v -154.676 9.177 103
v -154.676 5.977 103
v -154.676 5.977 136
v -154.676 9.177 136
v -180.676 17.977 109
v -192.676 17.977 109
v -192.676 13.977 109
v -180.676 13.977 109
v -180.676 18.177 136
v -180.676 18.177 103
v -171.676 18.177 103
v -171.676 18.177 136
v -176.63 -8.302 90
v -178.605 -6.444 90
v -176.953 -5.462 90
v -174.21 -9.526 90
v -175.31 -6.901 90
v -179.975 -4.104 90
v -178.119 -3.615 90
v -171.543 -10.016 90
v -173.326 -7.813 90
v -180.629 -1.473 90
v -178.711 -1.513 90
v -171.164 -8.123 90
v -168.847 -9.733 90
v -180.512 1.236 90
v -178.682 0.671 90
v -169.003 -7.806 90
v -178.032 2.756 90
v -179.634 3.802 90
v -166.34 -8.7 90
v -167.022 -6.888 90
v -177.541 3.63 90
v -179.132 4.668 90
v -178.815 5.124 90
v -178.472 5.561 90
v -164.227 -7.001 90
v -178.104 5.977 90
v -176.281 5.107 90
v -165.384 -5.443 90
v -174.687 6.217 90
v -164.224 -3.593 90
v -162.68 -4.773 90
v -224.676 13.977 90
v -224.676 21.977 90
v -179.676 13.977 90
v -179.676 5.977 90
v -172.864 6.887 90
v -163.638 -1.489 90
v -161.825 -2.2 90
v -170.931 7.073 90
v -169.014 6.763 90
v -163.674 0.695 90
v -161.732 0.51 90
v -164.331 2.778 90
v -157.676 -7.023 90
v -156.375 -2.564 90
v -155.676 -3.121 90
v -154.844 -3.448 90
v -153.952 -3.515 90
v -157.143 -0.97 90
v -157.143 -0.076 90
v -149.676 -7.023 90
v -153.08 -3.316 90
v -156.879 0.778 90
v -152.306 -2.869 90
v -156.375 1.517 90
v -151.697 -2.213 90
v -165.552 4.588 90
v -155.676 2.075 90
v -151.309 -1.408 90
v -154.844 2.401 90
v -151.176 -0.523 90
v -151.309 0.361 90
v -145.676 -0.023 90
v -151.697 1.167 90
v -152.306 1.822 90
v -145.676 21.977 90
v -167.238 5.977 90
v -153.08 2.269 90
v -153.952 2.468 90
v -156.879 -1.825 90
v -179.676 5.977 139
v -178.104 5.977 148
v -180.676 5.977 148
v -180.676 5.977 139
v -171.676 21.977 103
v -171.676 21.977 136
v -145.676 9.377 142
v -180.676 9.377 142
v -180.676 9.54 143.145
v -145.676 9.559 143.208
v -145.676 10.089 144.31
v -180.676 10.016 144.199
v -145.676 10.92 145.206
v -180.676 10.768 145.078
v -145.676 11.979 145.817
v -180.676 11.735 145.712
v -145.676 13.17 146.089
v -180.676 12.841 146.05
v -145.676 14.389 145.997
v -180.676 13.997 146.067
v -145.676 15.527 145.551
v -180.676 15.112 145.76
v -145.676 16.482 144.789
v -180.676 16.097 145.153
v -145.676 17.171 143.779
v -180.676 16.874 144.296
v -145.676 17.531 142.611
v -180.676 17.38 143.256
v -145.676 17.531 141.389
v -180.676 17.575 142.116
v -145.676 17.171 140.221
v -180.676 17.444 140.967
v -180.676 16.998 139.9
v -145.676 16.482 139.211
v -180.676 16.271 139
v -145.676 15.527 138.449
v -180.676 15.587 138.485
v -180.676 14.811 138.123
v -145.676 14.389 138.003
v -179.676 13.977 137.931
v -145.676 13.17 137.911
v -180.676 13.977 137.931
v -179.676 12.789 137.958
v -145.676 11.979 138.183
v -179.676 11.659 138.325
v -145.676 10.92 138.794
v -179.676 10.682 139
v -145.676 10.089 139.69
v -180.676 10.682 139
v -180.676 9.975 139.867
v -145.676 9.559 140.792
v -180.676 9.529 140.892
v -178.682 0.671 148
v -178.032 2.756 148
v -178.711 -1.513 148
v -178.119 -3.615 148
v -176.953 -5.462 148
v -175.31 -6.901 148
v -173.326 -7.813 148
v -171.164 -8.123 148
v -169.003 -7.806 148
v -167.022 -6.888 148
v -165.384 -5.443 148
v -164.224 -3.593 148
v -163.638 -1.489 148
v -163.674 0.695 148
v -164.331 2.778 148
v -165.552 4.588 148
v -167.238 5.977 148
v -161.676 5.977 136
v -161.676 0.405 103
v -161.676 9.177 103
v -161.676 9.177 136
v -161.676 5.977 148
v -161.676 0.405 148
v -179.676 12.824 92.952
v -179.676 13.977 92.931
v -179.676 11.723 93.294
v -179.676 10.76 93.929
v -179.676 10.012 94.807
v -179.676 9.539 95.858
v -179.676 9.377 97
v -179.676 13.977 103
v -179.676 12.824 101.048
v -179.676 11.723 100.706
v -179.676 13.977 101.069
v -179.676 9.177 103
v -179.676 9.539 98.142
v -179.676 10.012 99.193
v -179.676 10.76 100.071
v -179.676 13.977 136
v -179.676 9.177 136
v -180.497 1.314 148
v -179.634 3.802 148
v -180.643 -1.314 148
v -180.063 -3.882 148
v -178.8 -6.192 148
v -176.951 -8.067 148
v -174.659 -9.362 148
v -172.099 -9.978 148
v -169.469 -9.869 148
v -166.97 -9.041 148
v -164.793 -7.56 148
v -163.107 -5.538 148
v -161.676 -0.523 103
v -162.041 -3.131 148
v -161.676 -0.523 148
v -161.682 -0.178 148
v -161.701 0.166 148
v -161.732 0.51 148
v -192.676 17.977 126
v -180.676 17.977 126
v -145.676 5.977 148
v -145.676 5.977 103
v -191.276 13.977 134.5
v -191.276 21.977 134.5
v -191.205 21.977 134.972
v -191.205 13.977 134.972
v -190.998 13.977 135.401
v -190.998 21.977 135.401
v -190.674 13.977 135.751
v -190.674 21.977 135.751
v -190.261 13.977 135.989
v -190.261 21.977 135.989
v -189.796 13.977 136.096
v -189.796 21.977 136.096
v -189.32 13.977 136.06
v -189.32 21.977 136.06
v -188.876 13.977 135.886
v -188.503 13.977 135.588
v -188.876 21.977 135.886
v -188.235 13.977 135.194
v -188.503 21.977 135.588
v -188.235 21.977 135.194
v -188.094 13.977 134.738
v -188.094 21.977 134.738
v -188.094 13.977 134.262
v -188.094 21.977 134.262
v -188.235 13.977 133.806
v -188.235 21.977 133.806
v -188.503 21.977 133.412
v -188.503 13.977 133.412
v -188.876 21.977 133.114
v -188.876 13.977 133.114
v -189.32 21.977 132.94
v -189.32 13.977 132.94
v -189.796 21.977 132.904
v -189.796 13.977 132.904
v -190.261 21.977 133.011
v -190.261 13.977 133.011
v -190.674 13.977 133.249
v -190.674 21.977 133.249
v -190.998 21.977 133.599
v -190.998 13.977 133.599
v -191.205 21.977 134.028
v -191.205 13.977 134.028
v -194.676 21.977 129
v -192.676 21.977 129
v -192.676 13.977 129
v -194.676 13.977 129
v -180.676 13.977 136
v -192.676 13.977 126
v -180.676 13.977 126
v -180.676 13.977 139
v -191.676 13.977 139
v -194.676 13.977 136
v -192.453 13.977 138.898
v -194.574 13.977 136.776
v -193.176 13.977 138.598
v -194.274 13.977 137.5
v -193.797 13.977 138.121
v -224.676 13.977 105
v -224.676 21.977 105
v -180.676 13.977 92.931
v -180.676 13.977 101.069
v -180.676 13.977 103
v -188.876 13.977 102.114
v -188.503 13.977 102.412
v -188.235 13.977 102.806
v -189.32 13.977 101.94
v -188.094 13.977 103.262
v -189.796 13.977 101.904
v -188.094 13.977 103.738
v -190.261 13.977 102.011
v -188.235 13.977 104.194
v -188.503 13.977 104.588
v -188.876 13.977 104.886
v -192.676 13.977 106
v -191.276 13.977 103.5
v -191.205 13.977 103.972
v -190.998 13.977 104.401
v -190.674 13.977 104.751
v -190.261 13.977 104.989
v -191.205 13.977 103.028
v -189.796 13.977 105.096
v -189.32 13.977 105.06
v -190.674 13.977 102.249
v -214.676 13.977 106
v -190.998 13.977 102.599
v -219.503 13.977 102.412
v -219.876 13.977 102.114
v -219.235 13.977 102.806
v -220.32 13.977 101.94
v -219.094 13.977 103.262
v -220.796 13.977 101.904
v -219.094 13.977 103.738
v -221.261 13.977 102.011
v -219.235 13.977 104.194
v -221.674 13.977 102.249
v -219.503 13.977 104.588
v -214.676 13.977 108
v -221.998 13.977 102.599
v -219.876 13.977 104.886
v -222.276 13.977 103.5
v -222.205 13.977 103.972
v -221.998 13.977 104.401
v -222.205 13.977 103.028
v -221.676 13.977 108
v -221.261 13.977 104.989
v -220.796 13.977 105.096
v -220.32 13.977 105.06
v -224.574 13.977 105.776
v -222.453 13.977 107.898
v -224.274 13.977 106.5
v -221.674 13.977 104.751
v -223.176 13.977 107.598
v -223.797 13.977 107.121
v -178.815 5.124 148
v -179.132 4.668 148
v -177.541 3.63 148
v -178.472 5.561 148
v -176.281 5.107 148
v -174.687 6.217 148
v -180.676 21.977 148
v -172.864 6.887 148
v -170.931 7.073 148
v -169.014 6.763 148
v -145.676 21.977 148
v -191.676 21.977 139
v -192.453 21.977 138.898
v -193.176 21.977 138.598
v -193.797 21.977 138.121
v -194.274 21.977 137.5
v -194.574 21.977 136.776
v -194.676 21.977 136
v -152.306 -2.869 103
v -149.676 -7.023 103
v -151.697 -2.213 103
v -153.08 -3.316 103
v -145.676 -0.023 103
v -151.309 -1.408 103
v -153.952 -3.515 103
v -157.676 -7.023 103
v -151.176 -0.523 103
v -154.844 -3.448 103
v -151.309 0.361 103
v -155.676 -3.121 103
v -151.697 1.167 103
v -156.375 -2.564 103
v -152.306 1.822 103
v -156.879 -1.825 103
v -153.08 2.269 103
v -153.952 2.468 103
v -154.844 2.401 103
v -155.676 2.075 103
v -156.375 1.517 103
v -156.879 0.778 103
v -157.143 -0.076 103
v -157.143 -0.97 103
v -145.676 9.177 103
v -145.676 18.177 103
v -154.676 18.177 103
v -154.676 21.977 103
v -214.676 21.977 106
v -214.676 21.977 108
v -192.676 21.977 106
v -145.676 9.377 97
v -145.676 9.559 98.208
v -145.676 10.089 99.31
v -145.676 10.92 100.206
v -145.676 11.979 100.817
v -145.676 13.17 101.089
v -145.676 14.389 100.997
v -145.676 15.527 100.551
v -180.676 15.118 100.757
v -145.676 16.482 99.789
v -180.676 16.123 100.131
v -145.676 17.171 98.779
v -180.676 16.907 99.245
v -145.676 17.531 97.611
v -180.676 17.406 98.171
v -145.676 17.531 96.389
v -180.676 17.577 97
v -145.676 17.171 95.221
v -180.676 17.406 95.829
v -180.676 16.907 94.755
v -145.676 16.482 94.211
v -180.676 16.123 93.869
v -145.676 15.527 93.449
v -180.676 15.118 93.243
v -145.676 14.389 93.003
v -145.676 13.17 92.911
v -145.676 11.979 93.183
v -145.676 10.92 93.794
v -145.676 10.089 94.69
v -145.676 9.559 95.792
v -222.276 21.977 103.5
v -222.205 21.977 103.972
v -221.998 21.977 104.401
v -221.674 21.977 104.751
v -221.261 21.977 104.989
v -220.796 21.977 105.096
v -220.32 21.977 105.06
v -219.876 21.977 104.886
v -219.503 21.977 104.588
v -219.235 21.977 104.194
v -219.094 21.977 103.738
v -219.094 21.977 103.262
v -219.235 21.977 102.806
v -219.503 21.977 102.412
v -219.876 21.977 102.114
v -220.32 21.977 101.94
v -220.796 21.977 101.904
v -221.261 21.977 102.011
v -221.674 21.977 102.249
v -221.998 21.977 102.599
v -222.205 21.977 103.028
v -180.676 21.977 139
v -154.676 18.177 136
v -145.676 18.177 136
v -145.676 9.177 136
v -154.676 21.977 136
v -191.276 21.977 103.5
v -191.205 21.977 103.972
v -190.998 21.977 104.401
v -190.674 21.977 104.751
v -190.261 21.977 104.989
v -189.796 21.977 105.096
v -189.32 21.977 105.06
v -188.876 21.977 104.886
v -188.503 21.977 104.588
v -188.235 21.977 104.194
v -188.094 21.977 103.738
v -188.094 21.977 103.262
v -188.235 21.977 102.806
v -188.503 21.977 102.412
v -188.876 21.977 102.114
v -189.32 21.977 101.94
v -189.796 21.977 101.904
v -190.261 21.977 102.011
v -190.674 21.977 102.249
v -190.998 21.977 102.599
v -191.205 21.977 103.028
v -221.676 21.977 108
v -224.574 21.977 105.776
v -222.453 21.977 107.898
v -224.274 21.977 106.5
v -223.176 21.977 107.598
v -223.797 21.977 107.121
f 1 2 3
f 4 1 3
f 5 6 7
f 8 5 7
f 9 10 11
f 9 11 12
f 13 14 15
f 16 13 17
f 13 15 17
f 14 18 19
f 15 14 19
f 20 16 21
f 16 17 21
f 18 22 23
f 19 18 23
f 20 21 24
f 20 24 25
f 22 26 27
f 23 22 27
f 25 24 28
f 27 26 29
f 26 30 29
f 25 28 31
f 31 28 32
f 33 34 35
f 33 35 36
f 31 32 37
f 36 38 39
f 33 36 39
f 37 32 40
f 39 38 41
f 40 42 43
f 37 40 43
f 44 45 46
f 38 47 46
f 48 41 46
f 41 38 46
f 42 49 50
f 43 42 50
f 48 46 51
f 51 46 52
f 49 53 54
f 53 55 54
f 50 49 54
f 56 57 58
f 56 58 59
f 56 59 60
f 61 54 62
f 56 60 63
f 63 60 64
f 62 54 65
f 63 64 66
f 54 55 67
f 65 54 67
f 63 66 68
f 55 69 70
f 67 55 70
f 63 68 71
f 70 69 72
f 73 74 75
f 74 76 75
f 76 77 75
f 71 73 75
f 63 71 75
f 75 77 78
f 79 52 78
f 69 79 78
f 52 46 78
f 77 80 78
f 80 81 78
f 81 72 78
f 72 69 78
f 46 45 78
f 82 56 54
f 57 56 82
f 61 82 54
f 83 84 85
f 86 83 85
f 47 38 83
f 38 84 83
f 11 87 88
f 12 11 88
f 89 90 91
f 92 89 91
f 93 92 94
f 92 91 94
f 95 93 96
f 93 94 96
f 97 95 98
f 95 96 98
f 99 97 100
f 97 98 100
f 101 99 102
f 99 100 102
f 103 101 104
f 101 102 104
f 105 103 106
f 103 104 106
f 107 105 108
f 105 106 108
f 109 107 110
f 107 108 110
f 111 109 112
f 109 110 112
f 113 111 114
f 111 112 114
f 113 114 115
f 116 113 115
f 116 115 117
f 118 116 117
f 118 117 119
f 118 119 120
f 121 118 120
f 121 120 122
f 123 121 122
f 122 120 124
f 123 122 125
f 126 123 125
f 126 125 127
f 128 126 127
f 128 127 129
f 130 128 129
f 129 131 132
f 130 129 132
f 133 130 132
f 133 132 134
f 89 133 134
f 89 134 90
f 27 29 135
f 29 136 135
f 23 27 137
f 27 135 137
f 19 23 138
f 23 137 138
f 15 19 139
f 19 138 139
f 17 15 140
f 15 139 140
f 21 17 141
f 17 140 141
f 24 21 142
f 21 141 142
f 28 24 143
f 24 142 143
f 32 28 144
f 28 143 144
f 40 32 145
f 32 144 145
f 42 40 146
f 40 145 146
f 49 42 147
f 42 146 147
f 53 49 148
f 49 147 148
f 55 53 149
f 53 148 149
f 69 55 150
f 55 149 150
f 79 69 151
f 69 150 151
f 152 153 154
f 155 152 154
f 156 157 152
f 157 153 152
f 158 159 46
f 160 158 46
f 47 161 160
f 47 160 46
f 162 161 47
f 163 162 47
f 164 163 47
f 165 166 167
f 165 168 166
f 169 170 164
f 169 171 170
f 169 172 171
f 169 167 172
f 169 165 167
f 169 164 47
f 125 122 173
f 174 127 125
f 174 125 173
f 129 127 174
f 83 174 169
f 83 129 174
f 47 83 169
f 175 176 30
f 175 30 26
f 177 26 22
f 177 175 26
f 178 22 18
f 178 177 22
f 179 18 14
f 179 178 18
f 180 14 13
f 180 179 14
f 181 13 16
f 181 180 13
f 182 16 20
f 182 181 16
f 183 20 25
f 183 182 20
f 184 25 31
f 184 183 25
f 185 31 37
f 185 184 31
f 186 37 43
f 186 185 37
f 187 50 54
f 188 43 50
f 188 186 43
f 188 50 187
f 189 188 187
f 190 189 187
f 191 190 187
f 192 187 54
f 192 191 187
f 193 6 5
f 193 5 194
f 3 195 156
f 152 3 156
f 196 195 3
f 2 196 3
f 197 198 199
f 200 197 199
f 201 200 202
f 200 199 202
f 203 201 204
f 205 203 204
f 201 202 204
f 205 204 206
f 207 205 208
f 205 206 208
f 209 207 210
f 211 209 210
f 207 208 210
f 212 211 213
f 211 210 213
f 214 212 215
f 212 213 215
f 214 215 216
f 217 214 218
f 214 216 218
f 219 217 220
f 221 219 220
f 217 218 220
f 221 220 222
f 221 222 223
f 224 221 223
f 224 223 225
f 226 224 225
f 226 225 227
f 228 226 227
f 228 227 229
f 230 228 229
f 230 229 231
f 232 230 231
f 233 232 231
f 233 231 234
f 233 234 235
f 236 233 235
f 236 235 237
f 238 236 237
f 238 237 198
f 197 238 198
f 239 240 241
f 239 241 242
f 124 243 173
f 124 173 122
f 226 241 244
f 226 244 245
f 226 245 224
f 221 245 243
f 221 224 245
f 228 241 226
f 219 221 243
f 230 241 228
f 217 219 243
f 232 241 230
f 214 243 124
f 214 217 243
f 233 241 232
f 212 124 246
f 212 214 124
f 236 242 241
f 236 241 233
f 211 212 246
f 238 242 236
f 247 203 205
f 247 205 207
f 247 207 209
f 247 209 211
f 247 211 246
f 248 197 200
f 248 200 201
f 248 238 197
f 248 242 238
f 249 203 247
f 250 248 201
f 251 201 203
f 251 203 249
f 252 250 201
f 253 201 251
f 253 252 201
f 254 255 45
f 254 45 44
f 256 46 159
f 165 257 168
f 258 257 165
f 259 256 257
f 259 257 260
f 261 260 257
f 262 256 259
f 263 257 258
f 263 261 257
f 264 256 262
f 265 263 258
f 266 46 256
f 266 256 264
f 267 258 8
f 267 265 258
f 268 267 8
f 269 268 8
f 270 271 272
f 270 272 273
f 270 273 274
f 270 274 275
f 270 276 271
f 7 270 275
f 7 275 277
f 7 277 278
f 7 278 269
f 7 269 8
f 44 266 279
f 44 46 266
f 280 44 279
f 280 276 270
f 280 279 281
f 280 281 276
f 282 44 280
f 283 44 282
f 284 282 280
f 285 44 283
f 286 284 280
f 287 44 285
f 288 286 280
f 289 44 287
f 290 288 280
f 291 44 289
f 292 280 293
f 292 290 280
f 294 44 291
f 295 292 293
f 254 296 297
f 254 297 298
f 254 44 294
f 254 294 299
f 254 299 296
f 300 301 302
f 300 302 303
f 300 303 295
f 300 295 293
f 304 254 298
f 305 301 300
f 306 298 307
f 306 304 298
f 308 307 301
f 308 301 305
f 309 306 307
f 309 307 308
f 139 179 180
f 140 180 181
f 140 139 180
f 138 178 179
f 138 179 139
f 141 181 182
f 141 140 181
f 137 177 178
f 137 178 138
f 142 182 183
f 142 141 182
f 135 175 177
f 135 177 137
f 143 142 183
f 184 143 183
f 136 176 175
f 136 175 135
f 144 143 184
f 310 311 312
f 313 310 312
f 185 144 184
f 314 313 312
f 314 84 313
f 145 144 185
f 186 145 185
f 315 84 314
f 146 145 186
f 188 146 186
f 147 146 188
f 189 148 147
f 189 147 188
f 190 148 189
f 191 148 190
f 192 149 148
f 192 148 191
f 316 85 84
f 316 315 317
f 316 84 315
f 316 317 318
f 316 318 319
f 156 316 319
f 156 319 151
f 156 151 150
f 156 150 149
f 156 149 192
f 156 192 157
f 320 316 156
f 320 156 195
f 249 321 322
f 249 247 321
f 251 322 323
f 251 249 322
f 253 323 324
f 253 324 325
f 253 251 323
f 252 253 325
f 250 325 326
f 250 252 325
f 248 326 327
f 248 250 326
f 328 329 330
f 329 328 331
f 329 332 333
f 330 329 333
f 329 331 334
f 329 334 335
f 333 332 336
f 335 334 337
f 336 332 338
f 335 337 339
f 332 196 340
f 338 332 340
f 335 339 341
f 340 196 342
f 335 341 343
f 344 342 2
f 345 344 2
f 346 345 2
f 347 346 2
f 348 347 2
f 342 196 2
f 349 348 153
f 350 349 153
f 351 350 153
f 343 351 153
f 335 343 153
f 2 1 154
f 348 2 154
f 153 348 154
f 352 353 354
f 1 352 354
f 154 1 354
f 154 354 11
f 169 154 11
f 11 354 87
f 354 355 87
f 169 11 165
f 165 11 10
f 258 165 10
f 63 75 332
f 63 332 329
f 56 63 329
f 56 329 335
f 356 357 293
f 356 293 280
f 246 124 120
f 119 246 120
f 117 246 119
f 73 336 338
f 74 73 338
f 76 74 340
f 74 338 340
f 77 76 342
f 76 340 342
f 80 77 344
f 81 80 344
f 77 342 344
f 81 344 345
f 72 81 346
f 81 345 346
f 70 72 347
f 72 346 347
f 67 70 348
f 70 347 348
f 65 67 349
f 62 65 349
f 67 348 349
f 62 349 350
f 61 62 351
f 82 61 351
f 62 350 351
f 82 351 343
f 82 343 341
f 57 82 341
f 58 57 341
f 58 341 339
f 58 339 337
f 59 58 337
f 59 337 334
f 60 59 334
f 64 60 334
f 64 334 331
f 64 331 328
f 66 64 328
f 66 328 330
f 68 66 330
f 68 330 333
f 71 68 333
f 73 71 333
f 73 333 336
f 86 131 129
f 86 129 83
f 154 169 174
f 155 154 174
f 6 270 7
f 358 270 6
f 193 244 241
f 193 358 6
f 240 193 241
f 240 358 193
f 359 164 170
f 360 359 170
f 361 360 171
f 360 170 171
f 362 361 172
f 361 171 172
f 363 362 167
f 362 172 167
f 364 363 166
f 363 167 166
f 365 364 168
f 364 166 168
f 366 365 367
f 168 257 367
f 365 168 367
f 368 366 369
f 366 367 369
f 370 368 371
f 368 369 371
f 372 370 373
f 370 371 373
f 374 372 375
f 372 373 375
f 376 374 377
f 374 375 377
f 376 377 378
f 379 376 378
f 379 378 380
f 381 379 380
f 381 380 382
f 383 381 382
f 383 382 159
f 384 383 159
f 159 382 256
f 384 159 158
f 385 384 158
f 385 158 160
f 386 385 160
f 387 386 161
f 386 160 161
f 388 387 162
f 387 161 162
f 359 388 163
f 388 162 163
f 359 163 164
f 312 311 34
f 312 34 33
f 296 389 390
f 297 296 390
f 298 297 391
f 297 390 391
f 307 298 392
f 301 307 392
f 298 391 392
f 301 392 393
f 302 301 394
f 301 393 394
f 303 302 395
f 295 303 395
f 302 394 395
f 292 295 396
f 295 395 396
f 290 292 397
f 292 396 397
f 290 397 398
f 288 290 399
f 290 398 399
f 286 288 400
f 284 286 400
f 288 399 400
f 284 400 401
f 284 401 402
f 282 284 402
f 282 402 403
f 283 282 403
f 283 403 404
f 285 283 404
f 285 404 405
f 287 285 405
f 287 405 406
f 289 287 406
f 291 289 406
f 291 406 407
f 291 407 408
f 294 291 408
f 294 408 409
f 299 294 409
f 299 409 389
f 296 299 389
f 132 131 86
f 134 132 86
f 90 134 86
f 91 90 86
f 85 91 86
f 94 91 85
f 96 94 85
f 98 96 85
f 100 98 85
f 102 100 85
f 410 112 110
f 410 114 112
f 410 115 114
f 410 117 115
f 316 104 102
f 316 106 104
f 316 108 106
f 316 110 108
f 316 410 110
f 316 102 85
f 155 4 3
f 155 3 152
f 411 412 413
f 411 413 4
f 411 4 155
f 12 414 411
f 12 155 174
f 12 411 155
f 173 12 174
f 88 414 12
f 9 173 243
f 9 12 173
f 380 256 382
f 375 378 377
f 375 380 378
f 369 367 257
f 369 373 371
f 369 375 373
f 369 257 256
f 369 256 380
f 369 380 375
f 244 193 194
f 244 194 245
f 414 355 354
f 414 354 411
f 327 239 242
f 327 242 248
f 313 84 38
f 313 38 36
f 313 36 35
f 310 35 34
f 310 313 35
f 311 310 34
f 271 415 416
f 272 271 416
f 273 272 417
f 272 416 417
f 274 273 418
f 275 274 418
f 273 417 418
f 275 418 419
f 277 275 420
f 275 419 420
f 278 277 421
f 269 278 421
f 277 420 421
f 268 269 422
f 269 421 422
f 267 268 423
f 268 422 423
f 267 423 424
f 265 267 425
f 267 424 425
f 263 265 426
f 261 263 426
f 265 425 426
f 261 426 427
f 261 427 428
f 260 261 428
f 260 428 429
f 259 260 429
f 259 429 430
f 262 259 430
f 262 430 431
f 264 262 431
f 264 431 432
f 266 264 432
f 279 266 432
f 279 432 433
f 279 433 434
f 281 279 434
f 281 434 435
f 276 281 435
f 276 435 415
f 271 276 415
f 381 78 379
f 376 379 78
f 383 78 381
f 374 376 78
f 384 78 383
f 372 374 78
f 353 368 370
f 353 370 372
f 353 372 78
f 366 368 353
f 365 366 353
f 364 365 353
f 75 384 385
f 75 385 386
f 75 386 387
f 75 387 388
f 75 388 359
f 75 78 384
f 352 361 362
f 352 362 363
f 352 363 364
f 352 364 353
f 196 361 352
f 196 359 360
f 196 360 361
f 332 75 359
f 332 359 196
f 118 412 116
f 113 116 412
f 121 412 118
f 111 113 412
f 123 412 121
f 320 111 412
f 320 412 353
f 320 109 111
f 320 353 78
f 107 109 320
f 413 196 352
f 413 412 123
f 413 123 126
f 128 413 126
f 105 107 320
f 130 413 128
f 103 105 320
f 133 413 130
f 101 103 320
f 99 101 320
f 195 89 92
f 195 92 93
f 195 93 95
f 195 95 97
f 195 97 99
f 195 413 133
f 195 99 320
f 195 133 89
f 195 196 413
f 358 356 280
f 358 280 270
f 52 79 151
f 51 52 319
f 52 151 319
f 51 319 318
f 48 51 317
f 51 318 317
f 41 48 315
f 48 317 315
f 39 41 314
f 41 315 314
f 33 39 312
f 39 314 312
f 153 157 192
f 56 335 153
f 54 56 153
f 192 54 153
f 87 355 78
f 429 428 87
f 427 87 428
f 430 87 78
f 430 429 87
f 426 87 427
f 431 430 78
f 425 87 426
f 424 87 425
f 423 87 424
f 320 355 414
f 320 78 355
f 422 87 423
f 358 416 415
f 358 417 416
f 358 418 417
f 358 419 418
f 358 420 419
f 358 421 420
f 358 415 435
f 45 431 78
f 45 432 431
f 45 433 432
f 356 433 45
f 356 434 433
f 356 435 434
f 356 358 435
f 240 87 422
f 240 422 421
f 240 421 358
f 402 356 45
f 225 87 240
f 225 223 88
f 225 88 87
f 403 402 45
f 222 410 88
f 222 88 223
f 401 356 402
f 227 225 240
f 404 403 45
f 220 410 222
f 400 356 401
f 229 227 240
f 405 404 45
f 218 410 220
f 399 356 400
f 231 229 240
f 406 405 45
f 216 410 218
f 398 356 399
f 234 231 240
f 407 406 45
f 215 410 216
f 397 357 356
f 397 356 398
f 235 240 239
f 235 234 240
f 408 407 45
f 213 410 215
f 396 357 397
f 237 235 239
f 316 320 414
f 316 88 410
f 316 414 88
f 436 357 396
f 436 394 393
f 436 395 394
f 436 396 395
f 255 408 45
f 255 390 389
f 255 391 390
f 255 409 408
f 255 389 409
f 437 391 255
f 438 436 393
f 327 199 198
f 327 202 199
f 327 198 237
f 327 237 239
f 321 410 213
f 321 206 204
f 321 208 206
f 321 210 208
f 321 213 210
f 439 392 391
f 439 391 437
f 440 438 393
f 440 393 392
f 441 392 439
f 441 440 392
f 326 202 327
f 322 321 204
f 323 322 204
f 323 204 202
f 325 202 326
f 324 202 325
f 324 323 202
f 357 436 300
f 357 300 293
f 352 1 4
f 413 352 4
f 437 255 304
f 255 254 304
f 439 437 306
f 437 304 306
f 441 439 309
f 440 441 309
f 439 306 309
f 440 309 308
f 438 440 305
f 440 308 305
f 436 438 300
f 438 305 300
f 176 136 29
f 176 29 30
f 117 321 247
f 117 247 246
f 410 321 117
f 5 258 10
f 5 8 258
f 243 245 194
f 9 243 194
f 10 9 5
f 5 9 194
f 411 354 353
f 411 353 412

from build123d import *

# Parameters (mm, degrees)
PAD_DEPTH       = 58
SKETCH001_R     = 9.5
SKETCH001_R_2   = 7.6
PAD001_DEPTH    = 58
SKETCH002_R     = 7.6
SKETCH002_R_2   = 3
POCKET_DEPTH    = 58
SKETCH003_R     = 4.1
SKETCH003_W     = 9
SKETCH003_H     = 33
POCKET001_DEPTH = 55
SKETCH004_W     = 16
SKETCH004_H     = 13
POCKET002_DEPTH = 45
PAD002_DEPTH    = 58
SKETCH006_R     = 1.6
POCKET003_DEPTH = 17
SKETCH007_W     = 18
SKETCH007_H     = 58
POCKET004_DEPTH = 25
SKETCH008_W     = 17
SKETCH008_H     = 33
POCKET005_DEPTH = 5
SKETCH009_W     = 7
SKETCH009_H     = 33
POCKET006_DEPTH = 5
SKETCH010_W     = 8
SKETCH010_H     = 49
POCKET007_DEPTH = 45
SKETCH011_W     = 4
SKETCH011_H     = 17
POCKET008_DEPTH = 20
POCKET009_DEPTH = 58
FILLET_R        = 3
FILLET001_R     = 3


with BuildPart() as part:
    # Sketch → Pad (new body)
    with BuildSketch(Plane(origin=(-133, 0, 90), x_dir=(1, 0, 0), z_dir=(0, 0, 1))):
        Polygon((-47.676132, 21.976631), (5.323868, 21.976631), (5.323868, 5.976631), (-12.676132, 5.976631), (-12.676132, -0.023369), (-16.676132, -7.023369), (-24.676132, -7.023369), (-31.676132, 5.976631), (-47.676132, 5.976631), align=None)
    extrude(amount=PAD_DEPTH)

    # Sketch001 → Pad001 (new body)
    with BuildSketch(Plane(origin=(-133, 0, 148), x_dir=(1, 0, 0), z_dir=(0, 0, 1))):
        with Locations((-38.176132, -0.523369)):
            Circle(SKETCH001_R)
        with Locations((-38.176132, -0.523369)):
            Circle(SKETCH001_R_2, mode=Mode.SUBTRACT)
    extrude(amount=-PAD001_DEPTH)

    # Sketch002 → Pocket (cut)
    with BuildSketch(Plane(origin=(-133, 0, 148), x_dir=(1, 0, 0), z_dir=(0, 0, 1))):
        with Locations((-38.176132, -0.523369)):
            Circle(SKETCH002_R)
        with Locations((-21.176132, -0.523369)):
            Circle(SKETCH002_R_2)
    extrude(amount=-POCKET_DEPTH, mode=Mode.SUBTRACT)

    # Sketch003 → Pocket001 (cut)
    with BuildSketch(Plane(origin=(-180.676132, 0, 90), x_dir=(0, -1, 0), z_dir=(-1, 0, 0))):
        with Locations((-13.476631, 52)):
            Circle(SKETCH003_R)
        with Locations((-13.476631, 7)):
            Circle(SKETCH003_R)
        with Locations((-13.676631, 29.5)):
            Rectangle(SKETCH003_W, SKETCH003_H)
    extrude(amount=-POCKET001_DEPTH, mode=Mode.SUBTRACT)

    # Sketch004 → Pocket002 (cut)
    with BuildSketch(Plane(origin=(-133, 0, 148), x_dir=(1, 0, 0), z_dir=(0, 0, 1))):
        with Locations((-20.676132, -0.523369)):
            Rectangle(SKETCH004_W, SKETCH004_H)
    extrude(amount=-POCKET002_DEPTH, mode=Mode.SUBTRACT)

    # Sketch005 → Pad002 (new body)
    with BuildSketch(Plane(origin=(-133, 0, 148), x_dir=(1, 0, 0), z_dir=(0, 0, 1))):
        Polygon((-47.676132, 21.976631), (-91.676132, 21.976631), (-91.676132, 11.976631), (-81.676132, 11.976631), (-47.676132, 5.976631), align=None)
    extrude(amount=-PAD002_DEPTH)

    # Sketch006 → Pocket003 (cut)
    with BuildSketch(Plane(origin=(-133, 21.976631, 90), x_dir=(-1, 0, 0), z_dir=(0, 1, 0))):
        with Locations((56.676132, 44.5)):
            Circle(SKETCH006_R)
        with Locations((56.676132, 13.5)):
            Circle(SKETCH006_R)
        with Locations((87.676132, 13.5)):
            Circle(SKETCH006_R)
        Polygon((91.676132, 18), (81.676132, 18), (81.676132, 16), (59.676132, 16), (59.676132, 39), (61.676132, 39), (61.676132, 49), (47.676132, 49), (47.676132, 58), (91.676132, 58), align=None)
    extrude(amount=-POCKET003_DEPTH, mode=Mode.SUBTRACT)

    # Sketch007 → Pocket004 (cut)
    with BuildSketch(Plane(origin=(-133, 5.976631, 90), x_dir=(1, 0, 0), z_dir=(0, -1, 0))):
        with Locations((-3.676132, 29)):
            Rectangle(SKETCH007_W, SKETCH007_H)
    extrude(amount=-POCKET004_DEPTH, mode=Mode.SUBTRACT)

    # Sketch008 → Pocket005 (cut)
    with BuildSketch(Plane(origin=(-133, 21.976631, 90), x_dir=(-1, 0, 0), z_dir=(0, 1, 0))):
        with Locations((30.176132, 29.5)):
            Rectangle(SKETCH008_W, SKETCH008_H)
    extrude(amount=-POCKET005_DEPTH, mode=Mode.SUBTRACT)

    # Sketch009 → Pocket006 (cut)
    with BuildSketch(Plane(origin=(-133, 5.976631, 90), x_dir=(1, 0, 0), z_dir=(0, -1, 0))):
        with Locations((-25.176132, 29.5)):
            Rectangle(SKETCH009_W, SKETCH009_H)
    extrude(amount=-POCKET006_DEPTH, mode=Mode.SUBTRACT)

    # Sketch010 → Pocket007 (cut)
    with BuildSketch(Plane(origin=(-224.676132, 0, 90), x_dir=(0, -1, 0), z_dir=(-1, 0, 0))):
        with Locations((-9.976631, 24.5)):
            Rectangle(SKETCH010_W, SKETCH010_H)
    extrude(amount=-POCKET007_DEPTH, mode=Mode.SUBTRACT)

    # Sketch011 → Pocket008 (cut)
    with BuildSketch(Plane(origin=(-192.676132, 0, 90), x_dir=(0, -1, 0), z_dir=(-1, 0, 0))):
        with Locations((-15.976631, 27.5)):
            Rectangle(SKETCH011_W, SKETCH011_H)
    extrude(amount=-POCKET008_DEPTH, mode=Mode.SUBTRACT)

    # Sketch012 → Pocket009 (cut)
    with BuildSketch(Plane(origin=(-133, 0, 148), x_dir=(1, 0, 0), z_dir=(0, 0, 1))):
        Polygon((-38.722618, -1.360837), (-49.563332, 5.713227), (-49.016846, 6.550695), (-38.176132, -0.523369), align=None)
    extrude(amount=-POCKET009_DEPTH, mode=Mode.SUBTRACT)

    # Fillet
    fillet_edges = [part.edges().sort_by_distance(p)[0] for p in [
        (-224.676132, 17.976631, 108),
    ]]
    fillet(fillet_edges, radius=FILLET_R)

    # Fillet001
    fillet001_edges = [part.edges().sort_by_distance(p)[0] for p in [
        (-194.676132, 17.976631, 139),
    ]]
    fillet(fillet001_edges, radius=FILLET001_R)


solid = part.part
